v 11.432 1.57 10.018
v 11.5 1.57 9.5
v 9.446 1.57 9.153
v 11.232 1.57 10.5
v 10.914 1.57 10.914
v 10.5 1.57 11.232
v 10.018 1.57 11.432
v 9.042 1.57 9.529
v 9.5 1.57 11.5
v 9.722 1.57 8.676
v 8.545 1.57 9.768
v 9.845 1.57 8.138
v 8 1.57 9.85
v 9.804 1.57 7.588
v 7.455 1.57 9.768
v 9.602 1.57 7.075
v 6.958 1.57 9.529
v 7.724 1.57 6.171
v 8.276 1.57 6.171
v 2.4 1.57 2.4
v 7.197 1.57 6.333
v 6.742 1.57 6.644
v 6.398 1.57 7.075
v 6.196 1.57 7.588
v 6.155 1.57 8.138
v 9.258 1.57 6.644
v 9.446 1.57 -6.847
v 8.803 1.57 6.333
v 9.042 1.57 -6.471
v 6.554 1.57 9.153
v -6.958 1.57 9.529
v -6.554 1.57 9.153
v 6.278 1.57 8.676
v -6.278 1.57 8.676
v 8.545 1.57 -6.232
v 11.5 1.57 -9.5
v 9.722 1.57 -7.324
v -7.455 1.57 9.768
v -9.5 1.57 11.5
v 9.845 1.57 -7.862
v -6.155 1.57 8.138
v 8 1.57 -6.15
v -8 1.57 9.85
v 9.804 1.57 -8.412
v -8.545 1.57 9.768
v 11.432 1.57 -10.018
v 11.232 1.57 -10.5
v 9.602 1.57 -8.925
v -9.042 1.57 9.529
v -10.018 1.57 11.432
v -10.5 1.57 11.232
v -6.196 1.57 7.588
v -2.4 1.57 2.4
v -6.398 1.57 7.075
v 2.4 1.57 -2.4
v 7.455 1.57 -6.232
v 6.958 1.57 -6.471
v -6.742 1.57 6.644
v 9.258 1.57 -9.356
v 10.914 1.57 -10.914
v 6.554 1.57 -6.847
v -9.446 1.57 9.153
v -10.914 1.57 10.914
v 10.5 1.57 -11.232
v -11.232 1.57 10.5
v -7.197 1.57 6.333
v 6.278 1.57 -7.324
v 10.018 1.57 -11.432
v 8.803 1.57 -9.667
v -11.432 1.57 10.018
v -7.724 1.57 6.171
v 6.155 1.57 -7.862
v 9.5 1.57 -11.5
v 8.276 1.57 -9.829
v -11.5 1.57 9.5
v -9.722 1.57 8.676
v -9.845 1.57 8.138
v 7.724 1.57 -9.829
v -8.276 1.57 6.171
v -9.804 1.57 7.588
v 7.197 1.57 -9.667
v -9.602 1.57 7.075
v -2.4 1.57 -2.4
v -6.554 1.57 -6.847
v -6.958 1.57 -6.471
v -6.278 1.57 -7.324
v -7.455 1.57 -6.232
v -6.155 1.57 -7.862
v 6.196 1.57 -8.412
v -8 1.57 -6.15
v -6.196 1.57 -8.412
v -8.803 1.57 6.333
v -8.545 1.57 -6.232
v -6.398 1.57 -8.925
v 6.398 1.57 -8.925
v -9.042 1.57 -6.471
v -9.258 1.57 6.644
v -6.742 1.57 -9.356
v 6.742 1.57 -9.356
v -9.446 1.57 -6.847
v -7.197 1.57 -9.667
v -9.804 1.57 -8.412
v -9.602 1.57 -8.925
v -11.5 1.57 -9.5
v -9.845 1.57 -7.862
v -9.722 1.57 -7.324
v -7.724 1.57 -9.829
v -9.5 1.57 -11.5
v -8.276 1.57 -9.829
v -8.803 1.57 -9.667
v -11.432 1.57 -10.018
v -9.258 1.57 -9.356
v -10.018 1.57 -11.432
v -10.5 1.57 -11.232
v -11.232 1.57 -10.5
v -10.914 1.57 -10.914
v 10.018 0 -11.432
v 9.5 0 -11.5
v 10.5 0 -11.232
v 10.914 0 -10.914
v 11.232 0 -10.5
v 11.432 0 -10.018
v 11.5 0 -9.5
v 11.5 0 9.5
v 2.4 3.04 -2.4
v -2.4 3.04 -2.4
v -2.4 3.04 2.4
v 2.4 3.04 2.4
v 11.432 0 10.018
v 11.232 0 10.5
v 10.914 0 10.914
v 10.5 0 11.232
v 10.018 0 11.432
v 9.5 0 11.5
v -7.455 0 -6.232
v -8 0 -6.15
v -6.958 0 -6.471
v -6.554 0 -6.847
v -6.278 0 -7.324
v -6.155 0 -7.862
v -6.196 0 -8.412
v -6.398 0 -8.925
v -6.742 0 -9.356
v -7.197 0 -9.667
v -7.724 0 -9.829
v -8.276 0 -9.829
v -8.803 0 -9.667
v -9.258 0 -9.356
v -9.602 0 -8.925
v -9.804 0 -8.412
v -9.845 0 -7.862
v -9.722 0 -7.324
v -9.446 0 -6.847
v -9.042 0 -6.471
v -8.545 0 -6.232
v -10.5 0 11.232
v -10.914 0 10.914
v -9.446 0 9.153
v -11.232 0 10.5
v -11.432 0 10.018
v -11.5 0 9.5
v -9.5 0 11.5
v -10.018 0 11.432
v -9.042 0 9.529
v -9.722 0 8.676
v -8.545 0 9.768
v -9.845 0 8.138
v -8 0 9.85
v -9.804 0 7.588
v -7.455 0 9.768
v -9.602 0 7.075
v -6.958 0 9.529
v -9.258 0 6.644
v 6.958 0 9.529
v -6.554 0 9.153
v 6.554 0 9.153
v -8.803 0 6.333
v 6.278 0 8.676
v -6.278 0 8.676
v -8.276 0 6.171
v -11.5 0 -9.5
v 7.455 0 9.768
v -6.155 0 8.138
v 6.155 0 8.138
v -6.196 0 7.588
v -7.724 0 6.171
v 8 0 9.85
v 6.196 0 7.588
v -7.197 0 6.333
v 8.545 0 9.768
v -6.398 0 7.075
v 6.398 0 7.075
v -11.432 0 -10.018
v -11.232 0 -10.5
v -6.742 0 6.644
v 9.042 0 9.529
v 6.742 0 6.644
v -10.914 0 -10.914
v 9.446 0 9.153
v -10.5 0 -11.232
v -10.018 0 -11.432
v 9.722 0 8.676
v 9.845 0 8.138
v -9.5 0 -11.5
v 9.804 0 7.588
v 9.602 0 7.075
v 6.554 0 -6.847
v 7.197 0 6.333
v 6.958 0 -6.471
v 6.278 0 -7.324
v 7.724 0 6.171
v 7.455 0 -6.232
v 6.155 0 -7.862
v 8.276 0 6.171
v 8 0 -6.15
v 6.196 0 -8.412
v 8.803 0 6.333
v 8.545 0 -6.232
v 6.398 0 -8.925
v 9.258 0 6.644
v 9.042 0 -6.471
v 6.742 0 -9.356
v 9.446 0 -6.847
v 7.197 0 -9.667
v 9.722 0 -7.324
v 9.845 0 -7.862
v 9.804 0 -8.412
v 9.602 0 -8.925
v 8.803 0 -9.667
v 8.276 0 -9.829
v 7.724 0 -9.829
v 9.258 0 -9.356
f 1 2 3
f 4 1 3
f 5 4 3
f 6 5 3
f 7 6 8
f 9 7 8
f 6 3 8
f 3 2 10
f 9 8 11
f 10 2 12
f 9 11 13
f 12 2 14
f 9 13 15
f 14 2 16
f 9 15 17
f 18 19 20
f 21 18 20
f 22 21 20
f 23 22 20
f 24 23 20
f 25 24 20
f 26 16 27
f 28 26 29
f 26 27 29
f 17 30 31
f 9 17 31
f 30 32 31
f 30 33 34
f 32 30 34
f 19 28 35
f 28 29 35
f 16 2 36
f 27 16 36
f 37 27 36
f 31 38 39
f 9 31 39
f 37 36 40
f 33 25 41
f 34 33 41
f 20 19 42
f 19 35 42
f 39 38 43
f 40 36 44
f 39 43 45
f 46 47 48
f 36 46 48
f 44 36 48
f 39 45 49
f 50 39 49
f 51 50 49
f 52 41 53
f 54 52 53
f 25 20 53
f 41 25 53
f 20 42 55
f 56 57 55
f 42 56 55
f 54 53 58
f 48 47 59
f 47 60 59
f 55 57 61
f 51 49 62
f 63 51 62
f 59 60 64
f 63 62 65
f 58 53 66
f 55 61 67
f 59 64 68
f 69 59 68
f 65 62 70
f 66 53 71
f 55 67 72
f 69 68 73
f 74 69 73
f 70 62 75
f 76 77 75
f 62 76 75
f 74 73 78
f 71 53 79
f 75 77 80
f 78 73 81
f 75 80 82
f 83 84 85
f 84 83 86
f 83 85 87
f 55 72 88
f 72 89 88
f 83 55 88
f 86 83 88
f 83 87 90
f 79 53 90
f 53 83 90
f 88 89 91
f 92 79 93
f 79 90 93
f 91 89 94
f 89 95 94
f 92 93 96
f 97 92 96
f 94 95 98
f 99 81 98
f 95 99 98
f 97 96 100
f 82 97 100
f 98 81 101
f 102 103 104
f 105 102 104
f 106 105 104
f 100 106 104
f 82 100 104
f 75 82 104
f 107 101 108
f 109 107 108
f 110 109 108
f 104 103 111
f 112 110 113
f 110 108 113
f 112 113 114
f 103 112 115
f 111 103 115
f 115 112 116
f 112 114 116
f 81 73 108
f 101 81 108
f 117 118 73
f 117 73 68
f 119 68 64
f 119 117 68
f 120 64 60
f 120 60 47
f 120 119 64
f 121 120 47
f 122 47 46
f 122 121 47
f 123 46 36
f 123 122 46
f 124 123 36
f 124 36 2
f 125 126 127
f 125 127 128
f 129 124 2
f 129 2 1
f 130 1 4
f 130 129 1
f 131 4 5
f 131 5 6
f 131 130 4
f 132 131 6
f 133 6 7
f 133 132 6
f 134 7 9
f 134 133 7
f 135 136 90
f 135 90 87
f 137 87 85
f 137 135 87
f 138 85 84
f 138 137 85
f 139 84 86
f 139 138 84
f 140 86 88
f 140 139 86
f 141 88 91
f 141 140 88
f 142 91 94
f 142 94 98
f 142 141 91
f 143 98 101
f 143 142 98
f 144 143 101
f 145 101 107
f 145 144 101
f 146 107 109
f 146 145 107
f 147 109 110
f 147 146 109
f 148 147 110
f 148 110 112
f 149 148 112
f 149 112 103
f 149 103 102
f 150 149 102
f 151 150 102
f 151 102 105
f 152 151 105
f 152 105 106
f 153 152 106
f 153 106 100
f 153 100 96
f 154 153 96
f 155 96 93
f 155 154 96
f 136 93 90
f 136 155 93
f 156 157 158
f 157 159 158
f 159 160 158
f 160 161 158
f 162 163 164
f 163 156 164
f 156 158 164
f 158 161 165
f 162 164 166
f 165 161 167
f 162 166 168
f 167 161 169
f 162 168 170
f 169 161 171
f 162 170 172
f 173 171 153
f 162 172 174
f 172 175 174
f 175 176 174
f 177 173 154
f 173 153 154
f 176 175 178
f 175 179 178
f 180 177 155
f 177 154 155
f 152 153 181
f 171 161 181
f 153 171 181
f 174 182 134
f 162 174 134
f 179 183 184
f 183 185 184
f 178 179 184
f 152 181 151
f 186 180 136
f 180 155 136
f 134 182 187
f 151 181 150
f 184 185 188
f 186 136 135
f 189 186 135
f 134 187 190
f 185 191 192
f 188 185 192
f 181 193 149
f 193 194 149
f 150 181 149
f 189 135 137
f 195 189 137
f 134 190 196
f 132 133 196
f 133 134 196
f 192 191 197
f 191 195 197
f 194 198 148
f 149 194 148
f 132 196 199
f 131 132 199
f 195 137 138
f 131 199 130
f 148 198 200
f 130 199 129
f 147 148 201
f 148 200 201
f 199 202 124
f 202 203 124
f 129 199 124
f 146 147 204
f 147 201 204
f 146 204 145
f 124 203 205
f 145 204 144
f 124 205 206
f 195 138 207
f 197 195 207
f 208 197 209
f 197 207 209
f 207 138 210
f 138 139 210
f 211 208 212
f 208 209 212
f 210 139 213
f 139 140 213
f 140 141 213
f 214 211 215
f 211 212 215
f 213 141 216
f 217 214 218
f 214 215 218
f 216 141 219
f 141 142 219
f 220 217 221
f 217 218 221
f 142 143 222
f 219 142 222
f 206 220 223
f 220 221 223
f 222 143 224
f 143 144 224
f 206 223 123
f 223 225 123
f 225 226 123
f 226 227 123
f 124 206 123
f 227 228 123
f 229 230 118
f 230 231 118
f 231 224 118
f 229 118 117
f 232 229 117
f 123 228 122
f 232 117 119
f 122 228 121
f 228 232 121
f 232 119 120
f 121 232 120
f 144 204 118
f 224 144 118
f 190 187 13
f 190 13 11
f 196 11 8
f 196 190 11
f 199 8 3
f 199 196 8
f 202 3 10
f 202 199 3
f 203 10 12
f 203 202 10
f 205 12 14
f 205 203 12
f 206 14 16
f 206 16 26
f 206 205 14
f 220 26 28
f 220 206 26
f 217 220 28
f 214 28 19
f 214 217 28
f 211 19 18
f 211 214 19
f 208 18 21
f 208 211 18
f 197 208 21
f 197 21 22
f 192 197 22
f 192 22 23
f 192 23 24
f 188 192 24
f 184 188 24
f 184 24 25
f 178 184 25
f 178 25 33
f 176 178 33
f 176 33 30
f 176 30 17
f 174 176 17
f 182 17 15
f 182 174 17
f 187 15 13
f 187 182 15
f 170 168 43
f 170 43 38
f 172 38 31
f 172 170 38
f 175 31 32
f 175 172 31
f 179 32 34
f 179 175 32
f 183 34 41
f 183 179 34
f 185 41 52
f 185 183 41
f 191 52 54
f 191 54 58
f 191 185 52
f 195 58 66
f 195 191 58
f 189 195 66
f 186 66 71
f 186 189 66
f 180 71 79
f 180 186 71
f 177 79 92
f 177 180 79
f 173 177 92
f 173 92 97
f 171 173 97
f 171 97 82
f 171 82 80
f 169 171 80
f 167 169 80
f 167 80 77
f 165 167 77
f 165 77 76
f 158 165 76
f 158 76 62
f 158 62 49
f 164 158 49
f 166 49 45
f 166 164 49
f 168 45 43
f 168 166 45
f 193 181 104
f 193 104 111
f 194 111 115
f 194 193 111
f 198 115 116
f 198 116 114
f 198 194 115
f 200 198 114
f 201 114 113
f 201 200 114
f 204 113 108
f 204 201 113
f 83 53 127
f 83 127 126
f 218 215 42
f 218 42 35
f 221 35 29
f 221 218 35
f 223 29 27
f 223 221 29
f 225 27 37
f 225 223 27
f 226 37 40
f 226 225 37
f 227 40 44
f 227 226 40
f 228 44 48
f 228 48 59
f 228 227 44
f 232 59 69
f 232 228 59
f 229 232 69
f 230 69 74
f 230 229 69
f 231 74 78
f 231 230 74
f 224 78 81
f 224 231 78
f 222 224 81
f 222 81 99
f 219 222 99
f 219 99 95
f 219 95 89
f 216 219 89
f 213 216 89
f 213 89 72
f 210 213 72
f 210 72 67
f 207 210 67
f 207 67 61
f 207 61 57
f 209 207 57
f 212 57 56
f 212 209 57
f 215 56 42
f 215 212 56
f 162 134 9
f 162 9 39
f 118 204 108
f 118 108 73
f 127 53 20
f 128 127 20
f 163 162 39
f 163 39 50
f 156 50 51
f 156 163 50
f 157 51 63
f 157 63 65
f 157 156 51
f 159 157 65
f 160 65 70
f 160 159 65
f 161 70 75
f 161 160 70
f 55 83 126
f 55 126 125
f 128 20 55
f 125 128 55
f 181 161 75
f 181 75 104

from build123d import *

# Parameters (mm, degrees)
SKETCH1_R           = 1.85
SKETCH1_W           = 4.8
SKETCH1_H           = 4.8
BOSS_EXTRUDE1_DEPTH = 1.57
SKETCH2_W           = 4.8
SKETCH2_H           = 4.8
BOSS_EXTRUDE2_DEPTH = 1.47


with BuildPart() as part:
    # Sketch1 → Boss-Extrude1 (new body)
    # profile 1 of 2: a face of its own
    with BuildSketch(Plane(origin=(0, 0, 0), x_dir=(1, 0, 0), z_dir=(0, 1, 0))):
        with BuildLine():
            ThreePointArc((-11.5, 9.5), (-10.914213562, 10.914213562), (-9.5, 11.5))
            Line((-9.5, 11.5), (9.5, 11.5))
            ThreePointArc((9.5, 11.5), (10.914213562, 10.914213562), (11.5, 9.5))
            Line((11.5, 9.5), (11.5, -9.5))
            ThreePointArc((11.5, -9.5), (10.914213562, -10.914213562), (9.5, -11.5))
            Line((9.5, -11.5), (-9.5, -11.5))
            ThreePointArc((-9.5, -11.5), (-10.914213562, -10.914213562), (-11.5, -9.5))
            Line((-11.5, -9.5), (-11.5, 9.5))
        make_face()
        with Locations(Location((-8, -8, 0), (0, 0, 270))):
            Circle(SKETCH1_R, mode=Mode.SUBTRACT)
        with Locations(Location((8, -8, 0), (0, 0, 270))):
            Circle(SKETCH1_R, mode=Mode.SUBTRACT)
        with Locations(Location((8, 8, 0), (0, 0, 270))):
            Circle(SKETCH1_R, mode=Mode.SUBTRACT)
        with Locations(Location((-8, 8, 0), (0, 0, 270))):
            Circle(SKETCH1_R, mode=Mode.SUBTRACT)
        Rectangle(SKETCH1_W, SKETCH1_H, mode=Mode.SUBTRACT)
    # profile 2 of 2: a face of its own
    with BuildSketch(Plane(origin=(0, 0, 0), x_dir=(1, 0, 0), z_dir=(0, 1, 0))):
        Rectangle(SKETCH1_W, SKETCH1_H)
    extrude(amount=BOSS_EXTRUDE1_DEPTH)

    # Sketch2 → Boss-Extrude2 (add)
    with BuildSketch(Plane(origin=(0, 1.57, 0), x_dir=(1, 0, 0), z_dir=(0, 1, 0))):
        Rectangle(SKETCH2_W, SKETCH2_H)
    extrude(amount=BOSS_EXTRUDE2_DEPTH)


solid = part.part
